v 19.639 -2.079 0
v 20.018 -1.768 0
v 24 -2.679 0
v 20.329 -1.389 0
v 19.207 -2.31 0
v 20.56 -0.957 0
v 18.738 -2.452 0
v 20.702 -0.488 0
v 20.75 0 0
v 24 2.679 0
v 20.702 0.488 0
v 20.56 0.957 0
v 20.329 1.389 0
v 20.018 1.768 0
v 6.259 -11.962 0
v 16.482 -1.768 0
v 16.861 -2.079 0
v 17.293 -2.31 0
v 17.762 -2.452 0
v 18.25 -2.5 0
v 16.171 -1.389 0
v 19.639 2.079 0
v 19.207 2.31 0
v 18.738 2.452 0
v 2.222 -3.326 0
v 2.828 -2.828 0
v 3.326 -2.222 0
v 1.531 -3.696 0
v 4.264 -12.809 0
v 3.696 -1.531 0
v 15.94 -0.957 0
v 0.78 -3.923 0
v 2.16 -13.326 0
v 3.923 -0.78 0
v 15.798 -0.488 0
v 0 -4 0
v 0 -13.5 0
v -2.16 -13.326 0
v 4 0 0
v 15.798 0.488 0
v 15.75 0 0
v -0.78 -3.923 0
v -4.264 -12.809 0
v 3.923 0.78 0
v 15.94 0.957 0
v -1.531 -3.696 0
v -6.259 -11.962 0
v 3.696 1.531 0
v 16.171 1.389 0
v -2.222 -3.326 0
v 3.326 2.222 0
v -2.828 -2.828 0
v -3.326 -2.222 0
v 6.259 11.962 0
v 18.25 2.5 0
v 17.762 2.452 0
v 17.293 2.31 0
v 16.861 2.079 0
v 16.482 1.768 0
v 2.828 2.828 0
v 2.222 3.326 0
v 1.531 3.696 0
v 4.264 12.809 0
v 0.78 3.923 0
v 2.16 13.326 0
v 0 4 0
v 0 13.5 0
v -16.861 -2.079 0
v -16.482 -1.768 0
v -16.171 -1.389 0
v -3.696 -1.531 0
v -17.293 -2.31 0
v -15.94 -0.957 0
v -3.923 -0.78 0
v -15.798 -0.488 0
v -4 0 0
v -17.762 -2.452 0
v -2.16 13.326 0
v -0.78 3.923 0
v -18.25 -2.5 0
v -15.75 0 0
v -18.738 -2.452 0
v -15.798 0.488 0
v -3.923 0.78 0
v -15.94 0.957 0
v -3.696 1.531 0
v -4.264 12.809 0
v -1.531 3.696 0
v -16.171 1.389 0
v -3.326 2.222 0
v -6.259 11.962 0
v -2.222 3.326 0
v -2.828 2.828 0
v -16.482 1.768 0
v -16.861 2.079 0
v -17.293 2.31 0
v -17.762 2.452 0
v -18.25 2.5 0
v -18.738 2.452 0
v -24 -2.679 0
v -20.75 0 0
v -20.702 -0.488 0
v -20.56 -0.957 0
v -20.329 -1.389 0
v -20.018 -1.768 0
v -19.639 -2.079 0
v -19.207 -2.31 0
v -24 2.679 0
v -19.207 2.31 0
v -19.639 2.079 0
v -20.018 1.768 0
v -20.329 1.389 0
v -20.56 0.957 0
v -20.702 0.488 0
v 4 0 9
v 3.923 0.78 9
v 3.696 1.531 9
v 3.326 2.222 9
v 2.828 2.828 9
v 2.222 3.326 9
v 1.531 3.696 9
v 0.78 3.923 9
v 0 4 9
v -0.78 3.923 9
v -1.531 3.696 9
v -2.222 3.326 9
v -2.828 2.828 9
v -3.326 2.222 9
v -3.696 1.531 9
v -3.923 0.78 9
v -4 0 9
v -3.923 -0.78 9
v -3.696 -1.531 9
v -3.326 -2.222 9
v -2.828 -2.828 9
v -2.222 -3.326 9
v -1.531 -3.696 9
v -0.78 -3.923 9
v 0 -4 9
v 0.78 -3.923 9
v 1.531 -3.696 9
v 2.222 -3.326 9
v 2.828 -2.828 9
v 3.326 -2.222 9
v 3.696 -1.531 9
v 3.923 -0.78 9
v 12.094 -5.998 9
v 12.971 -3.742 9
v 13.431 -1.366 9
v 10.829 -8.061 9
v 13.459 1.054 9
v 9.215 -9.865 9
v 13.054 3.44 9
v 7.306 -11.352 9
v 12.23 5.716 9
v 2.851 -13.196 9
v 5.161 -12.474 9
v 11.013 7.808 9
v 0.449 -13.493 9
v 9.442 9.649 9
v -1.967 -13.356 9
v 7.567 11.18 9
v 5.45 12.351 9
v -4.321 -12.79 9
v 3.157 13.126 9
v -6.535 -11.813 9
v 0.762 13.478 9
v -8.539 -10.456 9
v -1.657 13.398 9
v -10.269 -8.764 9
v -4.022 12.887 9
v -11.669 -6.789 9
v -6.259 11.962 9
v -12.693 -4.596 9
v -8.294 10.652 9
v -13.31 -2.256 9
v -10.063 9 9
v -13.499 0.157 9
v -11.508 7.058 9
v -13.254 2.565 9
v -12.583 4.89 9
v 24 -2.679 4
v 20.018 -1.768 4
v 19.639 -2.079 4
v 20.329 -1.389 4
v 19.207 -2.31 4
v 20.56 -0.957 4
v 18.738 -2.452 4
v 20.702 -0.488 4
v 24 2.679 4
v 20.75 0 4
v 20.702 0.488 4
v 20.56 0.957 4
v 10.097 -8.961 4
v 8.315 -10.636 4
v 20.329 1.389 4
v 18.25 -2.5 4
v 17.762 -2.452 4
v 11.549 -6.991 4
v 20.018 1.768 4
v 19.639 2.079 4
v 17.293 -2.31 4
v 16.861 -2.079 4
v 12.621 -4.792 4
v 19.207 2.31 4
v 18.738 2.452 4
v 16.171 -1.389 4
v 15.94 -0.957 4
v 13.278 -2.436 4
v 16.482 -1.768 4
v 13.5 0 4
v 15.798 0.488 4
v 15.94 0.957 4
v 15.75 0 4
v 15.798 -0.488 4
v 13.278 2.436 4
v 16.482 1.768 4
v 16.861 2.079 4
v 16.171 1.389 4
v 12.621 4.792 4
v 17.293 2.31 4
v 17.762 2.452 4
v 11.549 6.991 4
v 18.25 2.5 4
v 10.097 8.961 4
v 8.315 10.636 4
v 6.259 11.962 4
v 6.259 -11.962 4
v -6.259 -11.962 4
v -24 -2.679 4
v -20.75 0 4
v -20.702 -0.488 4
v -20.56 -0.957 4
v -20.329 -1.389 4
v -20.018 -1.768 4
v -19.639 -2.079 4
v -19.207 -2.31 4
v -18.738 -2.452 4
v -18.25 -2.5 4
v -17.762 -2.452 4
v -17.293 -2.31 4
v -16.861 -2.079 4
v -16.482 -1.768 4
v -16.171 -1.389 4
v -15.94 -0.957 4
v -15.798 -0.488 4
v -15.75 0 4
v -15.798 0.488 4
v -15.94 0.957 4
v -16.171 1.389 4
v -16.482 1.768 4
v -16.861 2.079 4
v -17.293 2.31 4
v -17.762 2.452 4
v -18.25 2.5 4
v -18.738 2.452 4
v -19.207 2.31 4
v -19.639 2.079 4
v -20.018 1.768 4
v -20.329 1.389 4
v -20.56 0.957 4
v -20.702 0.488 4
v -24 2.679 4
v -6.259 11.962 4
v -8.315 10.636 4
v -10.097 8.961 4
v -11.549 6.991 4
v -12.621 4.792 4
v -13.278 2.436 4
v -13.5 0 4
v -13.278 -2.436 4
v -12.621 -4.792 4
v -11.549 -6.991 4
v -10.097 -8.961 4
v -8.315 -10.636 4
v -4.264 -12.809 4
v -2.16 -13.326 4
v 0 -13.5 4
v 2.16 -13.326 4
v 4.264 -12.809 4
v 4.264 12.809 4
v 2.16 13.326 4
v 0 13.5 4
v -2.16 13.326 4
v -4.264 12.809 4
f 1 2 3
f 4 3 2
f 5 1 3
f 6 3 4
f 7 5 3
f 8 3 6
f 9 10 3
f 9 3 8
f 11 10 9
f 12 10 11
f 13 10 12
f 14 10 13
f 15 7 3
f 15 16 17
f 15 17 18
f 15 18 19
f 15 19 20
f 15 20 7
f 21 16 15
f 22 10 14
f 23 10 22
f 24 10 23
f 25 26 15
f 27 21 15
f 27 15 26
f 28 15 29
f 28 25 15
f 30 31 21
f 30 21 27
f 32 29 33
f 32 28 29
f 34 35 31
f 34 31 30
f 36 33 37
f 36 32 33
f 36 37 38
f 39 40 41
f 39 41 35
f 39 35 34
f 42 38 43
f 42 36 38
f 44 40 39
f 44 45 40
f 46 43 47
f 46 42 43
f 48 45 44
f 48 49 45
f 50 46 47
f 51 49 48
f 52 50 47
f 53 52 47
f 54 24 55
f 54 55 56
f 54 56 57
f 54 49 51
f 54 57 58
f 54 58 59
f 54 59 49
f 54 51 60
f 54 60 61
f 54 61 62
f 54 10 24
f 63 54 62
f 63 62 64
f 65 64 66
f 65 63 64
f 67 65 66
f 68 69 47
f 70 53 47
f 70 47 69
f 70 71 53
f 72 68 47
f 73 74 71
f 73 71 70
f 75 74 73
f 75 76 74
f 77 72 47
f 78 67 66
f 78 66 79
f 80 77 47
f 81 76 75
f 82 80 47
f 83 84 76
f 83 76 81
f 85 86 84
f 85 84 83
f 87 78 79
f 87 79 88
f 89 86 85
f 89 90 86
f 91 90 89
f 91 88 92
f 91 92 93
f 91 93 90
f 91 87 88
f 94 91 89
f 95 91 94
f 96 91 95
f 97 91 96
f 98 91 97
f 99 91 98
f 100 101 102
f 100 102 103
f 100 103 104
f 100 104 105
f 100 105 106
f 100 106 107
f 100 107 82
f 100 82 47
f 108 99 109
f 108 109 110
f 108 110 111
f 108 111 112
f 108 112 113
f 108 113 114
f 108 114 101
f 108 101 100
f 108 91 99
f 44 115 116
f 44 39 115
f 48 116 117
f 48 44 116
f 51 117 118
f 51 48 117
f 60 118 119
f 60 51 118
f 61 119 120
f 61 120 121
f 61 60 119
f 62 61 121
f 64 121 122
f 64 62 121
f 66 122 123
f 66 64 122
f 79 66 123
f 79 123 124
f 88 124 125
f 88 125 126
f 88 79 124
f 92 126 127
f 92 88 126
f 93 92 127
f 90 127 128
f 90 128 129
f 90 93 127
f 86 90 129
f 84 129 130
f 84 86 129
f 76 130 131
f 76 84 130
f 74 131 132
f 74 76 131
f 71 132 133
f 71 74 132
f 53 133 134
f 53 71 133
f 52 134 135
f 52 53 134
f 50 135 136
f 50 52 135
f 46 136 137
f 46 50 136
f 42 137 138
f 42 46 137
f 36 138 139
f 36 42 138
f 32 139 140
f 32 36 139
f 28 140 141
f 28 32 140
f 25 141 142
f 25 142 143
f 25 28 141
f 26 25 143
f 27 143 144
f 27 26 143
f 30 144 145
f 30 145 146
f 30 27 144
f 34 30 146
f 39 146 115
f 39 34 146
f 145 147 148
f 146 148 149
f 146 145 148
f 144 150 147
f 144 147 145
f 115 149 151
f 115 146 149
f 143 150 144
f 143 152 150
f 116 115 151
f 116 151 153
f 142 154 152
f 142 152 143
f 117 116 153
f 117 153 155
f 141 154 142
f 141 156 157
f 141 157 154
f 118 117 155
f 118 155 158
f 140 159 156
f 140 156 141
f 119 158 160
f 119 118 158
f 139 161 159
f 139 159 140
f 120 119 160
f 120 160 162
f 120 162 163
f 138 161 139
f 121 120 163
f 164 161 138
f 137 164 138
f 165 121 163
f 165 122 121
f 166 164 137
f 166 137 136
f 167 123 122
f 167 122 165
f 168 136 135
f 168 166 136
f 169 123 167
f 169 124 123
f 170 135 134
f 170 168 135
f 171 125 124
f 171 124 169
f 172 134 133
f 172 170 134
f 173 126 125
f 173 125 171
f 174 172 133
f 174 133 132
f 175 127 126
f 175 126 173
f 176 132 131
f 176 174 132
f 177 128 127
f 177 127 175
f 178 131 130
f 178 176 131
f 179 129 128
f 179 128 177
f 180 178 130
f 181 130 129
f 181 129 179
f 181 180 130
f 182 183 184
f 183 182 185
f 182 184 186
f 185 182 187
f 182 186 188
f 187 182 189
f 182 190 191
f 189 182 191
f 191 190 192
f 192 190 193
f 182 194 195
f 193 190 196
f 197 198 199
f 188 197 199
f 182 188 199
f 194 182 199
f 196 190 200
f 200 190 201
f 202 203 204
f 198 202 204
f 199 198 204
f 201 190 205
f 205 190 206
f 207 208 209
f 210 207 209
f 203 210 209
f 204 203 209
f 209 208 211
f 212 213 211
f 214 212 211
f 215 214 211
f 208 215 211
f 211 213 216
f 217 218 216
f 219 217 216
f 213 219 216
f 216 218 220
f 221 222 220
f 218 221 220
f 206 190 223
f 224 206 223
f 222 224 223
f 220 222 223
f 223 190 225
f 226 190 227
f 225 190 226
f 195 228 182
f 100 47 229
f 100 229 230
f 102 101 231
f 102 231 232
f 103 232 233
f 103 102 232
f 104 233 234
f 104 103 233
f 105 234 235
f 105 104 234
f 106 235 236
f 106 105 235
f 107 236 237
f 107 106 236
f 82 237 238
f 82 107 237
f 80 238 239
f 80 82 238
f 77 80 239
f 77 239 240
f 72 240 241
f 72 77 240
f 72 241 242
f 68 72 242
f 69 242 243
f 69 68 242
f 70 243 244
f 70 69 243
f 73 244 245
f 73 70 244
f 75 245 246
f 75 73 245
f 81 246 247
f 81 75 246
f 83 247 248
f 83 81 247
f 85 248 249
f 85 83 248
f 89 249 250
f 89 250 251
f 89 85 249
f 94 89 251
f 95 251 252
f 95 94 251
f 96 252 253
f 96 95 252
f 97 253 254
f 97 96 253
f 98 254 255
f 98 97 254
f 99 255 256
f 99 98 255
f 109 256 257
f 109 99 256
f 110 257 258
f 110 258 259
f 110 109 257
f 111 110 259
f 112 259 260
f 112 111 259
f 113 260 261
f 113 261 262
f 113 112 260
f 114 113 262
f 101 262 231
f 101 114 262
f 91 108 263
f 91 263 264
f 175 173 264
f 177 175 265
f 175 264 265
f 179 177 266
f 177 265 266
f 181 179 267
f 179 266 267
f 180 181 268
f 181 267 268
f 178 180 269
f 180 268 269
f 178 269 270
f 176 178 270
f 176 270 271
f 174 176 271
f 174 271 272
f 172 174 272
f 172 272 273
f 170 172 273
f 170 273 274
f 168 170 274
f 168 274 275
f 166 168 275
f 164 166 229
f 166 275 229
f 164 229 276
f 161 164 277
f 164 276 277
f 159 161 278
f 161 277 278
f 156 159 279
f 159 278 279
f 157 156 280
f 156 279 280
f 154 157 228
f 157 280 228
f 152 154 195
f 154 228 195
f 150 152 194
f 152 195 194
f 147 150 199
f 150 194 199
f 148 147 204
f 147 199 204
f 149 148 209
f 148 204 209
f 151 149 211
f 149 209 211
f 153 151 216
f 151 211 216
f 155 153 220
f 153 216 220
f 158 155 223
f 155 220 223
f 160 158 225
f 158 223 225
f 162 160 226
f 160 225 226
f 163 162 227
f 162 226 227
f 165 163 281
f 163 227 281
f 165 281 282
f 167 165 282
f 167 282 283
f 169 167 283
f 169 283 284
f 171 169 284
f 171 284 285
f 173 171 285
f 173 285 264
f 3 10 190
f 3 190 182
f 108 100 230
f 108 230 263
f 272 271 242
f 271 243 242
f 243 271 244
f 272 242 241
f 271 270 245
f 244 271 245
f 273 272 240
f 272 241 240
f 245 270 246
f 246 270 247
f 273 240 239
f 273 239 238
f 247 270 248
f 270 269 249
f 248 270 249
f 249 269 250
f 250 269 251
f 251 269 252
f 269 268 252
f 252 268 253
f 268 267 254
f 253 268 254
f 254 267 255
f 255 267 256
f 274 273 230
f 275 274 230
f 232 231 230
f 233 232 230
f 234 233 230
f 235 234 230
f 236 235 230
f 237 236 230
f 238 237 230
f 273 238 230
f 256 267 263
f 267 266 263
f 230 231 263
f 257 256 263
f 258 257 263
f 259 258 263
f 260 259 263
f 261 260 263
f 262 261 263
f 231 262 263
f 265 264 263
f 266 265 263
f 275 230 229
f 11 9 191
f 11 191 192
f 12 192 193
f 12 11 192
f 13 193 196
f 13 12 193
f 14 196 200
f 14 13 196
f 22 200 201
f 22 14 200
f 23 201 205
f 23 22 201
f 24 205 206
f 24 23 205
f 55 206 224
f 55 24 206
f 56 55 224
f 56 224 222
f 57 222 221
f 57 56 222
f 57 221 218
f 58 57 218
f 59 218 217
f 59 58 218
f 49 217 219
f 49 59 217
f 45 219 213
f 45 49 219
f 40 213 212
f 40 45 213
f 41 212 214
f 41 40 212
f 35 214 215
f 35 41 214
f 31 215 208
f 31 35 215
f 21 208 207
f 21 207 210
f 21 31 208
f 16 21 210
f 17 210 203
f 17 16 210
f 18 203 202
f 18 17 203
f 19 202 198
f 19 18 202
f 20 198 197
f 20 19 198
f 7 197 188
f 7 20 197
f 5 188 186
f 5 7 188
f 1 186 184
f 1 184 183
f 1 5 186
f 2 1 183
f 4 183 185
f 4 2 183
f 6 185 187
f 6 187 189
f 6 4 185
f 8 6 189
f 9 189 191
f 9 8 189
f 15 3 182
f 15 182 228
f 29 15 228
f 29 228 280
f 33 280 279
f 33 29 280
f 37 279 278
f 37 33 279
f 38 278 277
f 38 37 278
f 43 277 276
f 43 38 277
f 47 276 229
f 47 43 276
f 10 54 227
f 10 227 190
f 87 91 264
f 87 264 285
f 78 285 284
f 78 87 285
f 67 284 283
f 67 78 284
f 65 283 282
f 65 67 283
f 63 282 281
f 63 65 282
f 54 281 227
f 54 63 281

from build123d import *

# Parameters (mm, degrees)
CROQUIS1_R              = 2.5
CROQUIS1_R_2            = 4
SALIENTE_EXTRUIR1_DEPTH = 4
CROQUIS2_R              = 13.5
CROQUIS2_R_2            = 4
SALIENTE_EXTRUIR2_DEPTH = 5


with BuildPart() as part:
    # Croquis1 → Saliente-Extruir1 (new body)
    with BuildSketch(Plane.XY):
        with BuildLine():
            Line((24, 2.678571429), (24, -2.678571429))
            Line((24, -2.678571429), (6.258759048, -11.961518933))
            ThreePointArc((6.258759048, -11.961518933), (0, -13.5), (-6.258759048, -11.961518933))
            Line((-6.258759048, -11.961518933), (-24, -2.678571429))
            Line((-24, -2.678571429), (-24, 2.678571429))
            Line((-24, 2.678571429), (-6.258759048, 11.961518933))
            ThreePointArc((-6.258759048, 11.961518933), (0, 13.5), (6.258759048, 11.961518933))
            Line((6.258759048, 11.961518933), (24, 2.678571429))
        make_face()
        with Locations((18.25, 0)):
            Circle(CROQUIS1_R, mode=Mode.SUBTRACT)
        with Locations(Location((-18.25, 0, 0), (0, 0, 180))):
            Circle(CROQUIS1_R, mode=Mode.SUBTRACT)
        Circle(CROQUIS1_R_2, mode=Mode.SUBTRACT)
    extrude(amount=SALIENTE_EXTRUIR1_DEPTH)

    # Croquis2 → Saliente-Extruir2 (add)
    with BuildSketch(Plane.XY.offset(4)):
        with Locations(Location((0, 0, 0), (0, 0, 117.620415862))):
            Circle(CROQUIS2_R)
        Circle(CROQUIS2_R_2, mode=Mode.SUBTRACT)
    extrude(amount=SALIENTE_EXTRUIR2_DEPTH)


solid = part.part
